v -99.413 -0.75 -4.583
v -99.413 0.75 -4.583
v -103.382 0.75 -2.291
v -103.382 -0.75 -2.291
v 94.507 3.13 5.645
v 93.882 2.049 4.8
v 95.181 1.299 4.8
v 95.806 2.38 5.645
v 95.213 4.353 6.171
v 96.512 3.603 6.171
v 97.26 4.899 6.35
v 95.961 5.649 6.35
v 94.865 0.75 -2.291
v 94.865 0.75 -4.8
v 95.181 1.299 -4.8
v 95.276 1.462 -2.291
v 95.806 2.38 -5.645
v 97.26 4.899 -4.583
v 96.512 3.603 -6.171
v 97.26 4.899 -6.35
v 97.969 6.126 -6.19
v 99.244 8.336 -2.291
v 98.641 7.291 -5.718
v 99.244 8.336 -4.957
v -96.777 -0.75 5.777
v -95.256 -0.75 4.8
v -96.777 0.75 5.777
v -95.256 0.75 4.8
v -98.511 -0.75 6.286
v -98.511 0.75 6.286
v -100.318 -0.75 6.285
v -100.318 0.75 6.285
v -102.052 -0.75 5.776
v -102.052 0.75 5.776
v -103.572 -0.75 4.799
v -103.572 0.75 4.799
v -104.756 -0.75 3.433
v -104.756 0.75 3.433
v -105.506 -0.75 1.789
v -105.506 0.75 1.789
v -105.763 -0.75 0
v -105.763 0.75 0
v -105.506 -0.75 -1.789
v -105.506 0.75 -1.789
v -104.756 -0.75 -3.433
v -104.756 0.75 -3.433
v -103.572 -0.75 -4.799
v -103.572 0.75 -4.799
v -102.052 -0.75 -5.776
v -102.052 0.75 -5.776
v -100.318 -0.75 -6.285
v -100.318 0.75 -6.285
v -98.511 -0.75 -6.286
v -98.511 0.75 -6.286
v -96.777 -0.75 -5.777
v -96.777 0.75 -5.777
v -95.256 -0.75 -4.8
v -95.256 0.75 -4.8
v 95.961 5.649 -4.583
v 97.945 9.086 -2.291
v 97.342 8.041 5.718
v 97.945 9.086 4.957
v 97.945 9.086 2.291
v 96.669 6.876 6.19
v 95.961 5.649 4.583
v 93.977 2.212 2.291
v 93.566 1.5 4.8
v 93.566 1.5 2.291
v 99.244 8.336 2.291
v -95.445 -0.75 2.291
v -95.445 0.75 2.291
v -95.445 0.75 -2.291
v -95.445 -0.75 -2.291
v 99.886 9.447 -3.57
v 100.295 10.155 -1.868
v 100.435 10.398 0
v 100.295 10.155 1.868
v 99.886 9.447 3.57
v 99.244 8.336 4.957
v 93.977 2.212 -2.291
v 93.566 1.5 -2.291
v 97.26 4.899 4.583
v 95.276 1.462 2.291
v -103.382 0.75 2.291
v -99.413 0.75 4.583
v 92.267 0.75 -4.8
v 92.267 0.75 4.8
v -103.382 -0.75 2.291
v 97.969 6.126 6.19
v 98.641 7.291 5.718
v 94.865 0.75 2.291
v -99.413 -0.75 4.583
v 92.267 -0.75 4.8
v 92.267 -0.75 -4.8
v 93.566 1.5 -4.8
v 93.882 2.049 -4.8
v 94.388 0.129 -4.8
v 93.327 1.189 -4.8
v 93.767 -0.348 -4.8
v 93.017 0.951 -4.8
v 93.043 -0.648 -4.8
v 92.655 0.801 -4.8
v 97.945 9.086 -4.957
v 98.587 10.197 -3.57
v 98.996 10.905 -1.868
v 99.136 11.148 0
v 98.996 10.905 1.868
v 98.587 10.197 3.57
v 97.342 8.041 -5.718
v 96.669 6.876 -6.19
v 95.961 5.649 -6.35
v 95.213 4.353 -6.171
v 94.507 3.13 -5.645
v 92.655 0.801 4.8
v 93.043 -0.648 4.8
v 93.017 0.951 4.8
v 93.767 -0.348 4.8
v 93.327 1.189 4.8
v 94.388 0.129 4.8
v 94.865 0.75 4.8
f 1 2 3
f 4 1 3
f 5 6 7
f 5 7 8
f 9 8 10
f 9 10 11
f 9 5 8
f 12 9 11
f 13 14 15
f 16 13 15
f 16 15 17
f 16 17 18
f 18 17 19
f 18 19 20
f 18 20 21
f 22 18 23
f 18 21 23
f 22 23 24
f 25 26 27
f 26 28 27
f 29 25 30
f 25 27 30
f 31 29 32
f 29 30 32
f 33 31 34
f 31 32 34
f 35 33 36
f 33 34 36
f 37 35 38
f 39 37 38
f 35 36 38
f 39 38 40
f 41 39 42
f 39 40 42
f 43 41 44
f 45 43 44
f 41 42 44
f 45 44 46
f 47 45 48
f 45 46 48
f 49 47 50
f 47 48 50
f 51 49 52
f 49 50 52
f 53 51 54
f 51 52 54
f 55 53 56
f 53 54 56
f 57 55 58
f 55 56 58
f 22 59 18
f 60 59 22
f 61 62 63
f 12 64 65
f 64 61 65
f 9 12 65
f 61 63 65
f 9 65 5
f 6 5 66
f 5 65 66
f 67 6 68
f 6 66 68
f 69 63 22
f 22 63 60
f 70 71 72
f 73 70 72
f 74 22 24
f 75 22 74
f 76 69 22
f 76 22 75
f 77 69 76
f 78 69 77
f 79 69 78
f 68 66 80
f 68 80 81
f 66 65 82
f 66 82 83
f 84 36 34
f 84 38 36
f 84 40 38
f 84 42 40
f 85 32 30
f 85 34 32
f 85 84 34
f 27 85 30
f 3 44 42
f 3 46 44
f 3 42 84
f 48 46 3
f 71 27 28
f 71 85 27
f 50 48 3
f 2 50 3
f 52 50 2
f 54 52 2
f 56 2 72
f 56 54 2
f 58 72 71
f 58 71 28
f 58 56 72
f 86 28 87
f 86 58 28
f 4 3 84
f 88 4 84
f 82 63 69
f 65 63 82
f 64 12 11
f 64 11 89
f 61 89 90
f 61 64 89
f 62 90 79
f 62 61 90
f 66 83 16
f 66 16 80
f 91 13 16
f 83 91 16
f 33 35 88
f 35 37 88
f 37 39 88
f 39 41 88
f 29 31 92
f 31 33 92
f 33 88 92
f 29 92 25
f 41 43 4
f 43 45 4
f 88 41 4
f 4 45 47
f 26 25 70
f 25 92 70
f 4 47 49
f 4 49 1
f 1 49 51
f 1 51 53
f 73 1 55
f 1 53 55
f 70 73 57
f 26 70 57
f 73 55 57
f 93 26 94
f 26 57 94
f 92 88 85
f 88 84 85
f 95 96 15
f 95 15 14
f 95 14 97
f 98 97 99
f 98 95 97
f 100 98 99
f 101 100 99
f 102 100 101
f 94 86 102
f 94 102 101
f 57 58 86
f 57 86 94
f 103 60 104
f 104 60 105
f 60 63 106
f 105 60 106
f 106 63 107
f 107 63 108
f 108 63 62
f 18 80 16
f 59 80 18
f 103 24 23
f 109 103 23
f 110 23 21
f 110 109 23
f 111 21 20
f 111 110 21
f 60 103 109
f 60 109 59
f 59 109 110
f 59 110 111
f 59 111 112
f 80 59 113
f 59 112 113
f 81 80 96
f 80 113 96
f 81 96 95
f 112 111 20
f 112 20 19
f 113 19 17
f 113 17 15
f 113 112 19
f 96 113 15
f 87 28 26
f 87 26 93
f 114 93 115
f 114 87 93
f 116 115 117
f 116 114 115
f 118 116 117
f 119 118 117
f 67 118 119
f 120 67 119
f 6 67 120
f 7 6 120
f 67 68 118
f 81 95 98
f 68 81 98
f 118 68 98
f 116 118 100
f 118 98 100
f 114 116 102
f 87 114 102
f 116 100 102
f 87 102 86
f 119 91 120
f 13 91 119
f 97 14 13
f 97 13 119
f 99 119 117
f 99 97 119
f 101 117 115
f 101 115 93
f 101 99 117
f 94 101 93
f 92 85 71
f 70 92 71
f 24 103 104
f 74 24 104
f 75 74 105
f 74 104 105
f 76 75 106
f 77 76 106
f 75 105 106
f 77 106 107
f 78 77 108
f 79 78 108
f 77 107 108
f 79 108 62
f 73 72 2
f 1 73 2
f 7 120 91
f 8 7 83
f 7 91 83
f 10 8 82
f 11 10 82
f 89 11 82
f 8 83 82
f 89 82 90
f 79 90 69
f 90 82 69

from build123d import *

# Parameters (mm, degrees)
SKETCH1_W              = 190.5125
SKETCH1_H              = 9.6
BOSS_EXTRUDE1_DEPTH    = 0.75
SKETCHED_START         = 85.719592776
SKETCHED_BEND1_DEPTH   = 7.280407224
SKETCHED_START_2       = -7
SKETCHED_BEND1_2_DEPTH = 14
SKETCHED_START_3       = -6.35
SKETCHED_BEND1_3_DEPTH = 4.058641119
SKETCHED_START_4       = 2.291358881
SKETCHED_BEND1_4_DEPTH = 4.058641119
SKETCHED_START_5       = -3.11420605
SKETCHED_BEND1_5_DEPTH = 6.2284121
SKETCHED_START_6       = 81.780241505
SKETCHED_BEND1_6_DEPTH = 10.219758495
SKETCHED_START_7       = 79
SKETCHED_BEND1_7_DEPTH = 2.780241505
SKETCHED_START_8       = 80.280241505
SKETCHED_BEND1_8_DEPTH = 1.5


with BuildPart() as part:
    # Sketch1 → Boss-Extrude1 (new, symmetric)
    # profile 1 of 3: a face of its own
    with BuildSketch(Plane(origin=(0, 0, 0), x_dir=(1, 0, 0), z_dir=(0, 1, 0))):
        with BuildLine():
            Line((-95.25625, 4.8), (-95.25625, -4.8))
            ThreePointArc((-95.25625, -4.8), (-105.763472631, 0), (-95.25625, 4.8))
        make_face()
        Polygon((-103.382222631, -2.291358881), (-99.413472631, -4.582717762), (-95.444722631, -2.291358881), (-95.444722631, 2.291358881), (-99.413472631, 4.582717762), (-103.382222631, 2.291358881), align=None, mode=Mode.SUBTRACT)
    # profile 2 of 3: a face of its own
    with BuildSketch(Plane(origin=(0, 0, 0), x_dir=(1, 0, 0), z_dir=(0, 1, 0))):
        Rectangle(SKETCH1_W, SKETCH1_H)
    # profile 3 of 3: a face of its own
    with BuildSketch(Plane(origin=(0, 0, 0), x_dir=(1, 0, 0), z_dir=(0, 1, 0))):
        with BuildLine():
            Line((95.25625, 4.8), (95.25625, -4.8))
            ThreePointArc((95.25625, -4.8), (105.763472631, 0), (95.25625, 4.8))
        make_face()
        Polygon((95.444722631, -2.291358881), (99.413472631, -4.582717762), (103.382222631, -2.291358881), (103.382222631, 2.291358881), (99.413472631, 4.582717762), (95.444722631, 2.291358881), align=None, mode=Mode.SUBTRACT)
    extrude(amount=BOSS_EXTRUDE1_DEPTH, both=True)

    # Sketched Bend1: read off the stored shape, not the designer's step
    # Sketched Bend1 outline → Sketched Bend1 (cut)
    with BuildSketch(Plane(origin=(0, 0, 0), x_dir=(0.49999999999999767, 0.86602540378444, 0), z_dir=(0.8660254037844399, -0.49999999999999795, 0)).offset(SKETCHED_START)):
        Polygon((48.903772606, 2.291358881), (48.903772606, -2.291358881), (52.872522606, -4.582717762), (56.841272606, -2.291358881), (56.841272606, 2.291358881), (52.872522606, 4.582717762), align=None)
    extrude(amount=SKETCHED_BEND1_DEPTH, mode=Mode.SUBTRACT)

    # Sketched Bend1 2 outline → Sketched Bend1 2 (cut)
    with BuildSketch(Plane.XY.offset(SKETCHED_START_2)):
        with BuildLine():
            Line((95.444722631, 0.75), (94.864701597, 0.75))
            ThreePointArc((94.864701597, 0.75), (93.766625385, -0.348076211), (92.266625385, -0.75))
            Line((92.266625385, -0.75), (95.444722631, -0.75))
            Line((95.444722631, -0.75), (95.444722631, 0.75))
        make_face()
    extrude(amount=SKETCHED_BEND1_2_DEPTH, mode=Mode.SUBTRACT)

    # Sketched Bend1 3 outline → Sketched Bend1 3 (add)
    with BuildSketch(Plane.XY.offset(SKETCHED_START_3)):
        with BuildLine():
            Line((99.244402974, 8.335865308), (97.945364869, 9.085865308))
            Line((97.945364869, 9.085865308), (93.565663491, 1.5))
            ThreePointArc((93.565663491, 1.5), (93.016625385, 0.950961894), (92.266625385, 0.75))
            Line((92.266625385, 0.75), (94.864701597, 0.75))
            Line((94.864701597, 0.75), (99.244402974, 8.335865308))
        make_face()
    extrude(amount=SKETCHED_BEND1_3_DEPTH)

    # Sketched Bend1 4 outline → Sketched Bend1 4 (add)
    with BuildSketch(Plane.XY.offset(SKETCHED_START_4)):
        with BuildLine():
            Line((99.244402974, 8.335865308), (97.945364869, 9.085865308))
            Line((97.945364869, 9.085865308), (93.565663491, 1.5))
            ThreePointArc((93.565663491, 1.5), (93.016625385, 0.950961894), (92.266625385, 0.75))
            Line((92.266625385, 0.75), (94.864701597, 0.75))
            Line((94.864701597, 0.75), (99.244402974, 8.335865308))
        make_face()
    extrude(amount=SKETCHED_BEND1_4_DEPTH)

    # Sketched Bend1 5 outline → Sketched Bend1 5 (add)
    with BuildSketch(Plane.XY.offset(SKETCHED_START_5)):
        with BuildLine():
            Line((94.864701597, 0.75), (95.275652974, 1.461788665))
            Line((95.275652974, 1.461788665), (93.976614869, 2.211788665))
            Line((93.976614869, 2.211788665), (93.565663491, 1.5))
            ThreePointArc((93.565663491, 1.5), (93.016625385, 0.950961894), (92.266625385, 0.75))
            Line((92.266625385, 0.75), (94.864701597, 0.75))
        make_face()
    extrude(amount=SKETCHED_BEND1_5_DEPTH)

    # Sketched Bend1 6 outline → Sketched Bend1 6 (cut)
    with BuildSketch(Plane(origin=(0, 0, 0), x_dir=(0.49999999999999767, 0.86602540378444, 0), z_dir=(0.8660254037844399, -0.49999999999999795, 0)).offset(SKETCHED_START_6)):
        with BuildLine():
            Line((48.903772606, -2.29135888), (45, -0.037514714))
            Line((45, -0.037514714), (45, -6.35))
            Line((45, -6.35), (52.872522564, -6.35))
            ThreePointArc((52.872522564, -6.35), (54.047030124, -6.240435248), (55.181007092, -5.915521902))
            Line((55.181007092, -5.915521902), (52.872522606, -4.582717762))
            Line((52.872522606, -4.582717762), (48.903772606, -2.29135888))
        make_face()
        with BuildLine():
            Line((45, 0.037514714), (48.903772606, 2.29135888))
            Line((48.903772606, 2.29135888), (52.872522606, 4.582717762))
            Line((52.872522606, 4.582717762), (55.181007092, 5.915521902))
            ThreePointArc((55.181007092, 5.915521902), (54.047030182, 6.240435237), (52.872522681, 6.35))
            Line((52.872522681, 6.35), (45, 6.35))
            Line((45, 6.35), (45, 0.037514714))
        make_face()
    extrude(amount=SKETCHED_BEND1_6_DEPTH, mode=Mode.SUBTRACT)

    # Sketched Bend1 7 outline → Sketched Bend1 7 (cut)
    with BuildSketch(Plane(origin=(0, 0, 0), x_dir=(0.49999999999999767, 0.86602540378444, 0), z_dir=(0.8660254037844399, -0.49999999999999795, 0)).offset(SKETCHED_START_7)):
        Polygon((56.841272607, -2.291358881), (48.903772606, -2.291358881), (52.872522606, -4.582717762), align=None)
        Polygon((48.903772606, 2.291358881), (56.841272607, 2.291358881), (52.872522606, 4.582717762), align=None)
        with BuildLine():
            Line((56.841272606, -6.35), (56.841272606, -4.956967161))
            ThreePointArc((56.841272606, -4.956967161), (54.975586842, -5.991629229), (52.872522564, -6.35))
            Line((52.872522564, -6.35), (56.841272606, -6.35))
        make_face()
        with BuildLine():
            Line((48.715299976, -4.8), (45, -4.8))
            Line((45, -4.8), (45, -6.35))
            Line((45, -6.35), (52.872522564, -6.35))
            ThreePointArc((52.872522564, -6.35), (50.654133531, -5.949894949), (48.715299976, -4.8))
        make_face()
        with BuildLine():
            Line((56.841272606, 4.956967161), (56.841272606, 6.35))
            Line((56.841272606, 6.35), (52.872522681, 6.35))
            ThreePointArc((52.872522681, 6.35), (54.975586897, 5.99162921), (56.841272606, 4.956967161))
        make_face()
        with BuildLine():
            Line((45, 6.35), (45, 4.8))
            Line((45, 4.8), (48.715299976, 4.8))
            ThreePointArc((48.715299976, 4.8), (50.654133586, 5.94989497), (52.872522681, 6.35))
            Line((52.872522681, 6.35), (45, 6.35))
        make_face()
    extrude(amount=SKETCHED_BEND1_7_DEPTH, mode=Mode.SUBTRACT)

    # Sketched Bend1 8 outline → Sketched Bend1 8 (add)
    with BuildSketch(Plane(origin=(0, 0, 0), x_dir=(0.49999999999999767, 0.86602540378444, 0), z_dir=(0.8660254037844399, -0.49999999999999795, 0)).offset(SKETCHED_START_8)):
        with BuildLine():
            Line((56.841272606, 4.956967161), (56.841272606, -4.956967161))
            ThreePointArc((56.841272606, -4.956967161), (59.222522606, 0), (56.841272606, 4.956967161))
        make_face()
    extrude(amount=SKETCHED_BEND1_8_DEPTH)


solid = part.part
